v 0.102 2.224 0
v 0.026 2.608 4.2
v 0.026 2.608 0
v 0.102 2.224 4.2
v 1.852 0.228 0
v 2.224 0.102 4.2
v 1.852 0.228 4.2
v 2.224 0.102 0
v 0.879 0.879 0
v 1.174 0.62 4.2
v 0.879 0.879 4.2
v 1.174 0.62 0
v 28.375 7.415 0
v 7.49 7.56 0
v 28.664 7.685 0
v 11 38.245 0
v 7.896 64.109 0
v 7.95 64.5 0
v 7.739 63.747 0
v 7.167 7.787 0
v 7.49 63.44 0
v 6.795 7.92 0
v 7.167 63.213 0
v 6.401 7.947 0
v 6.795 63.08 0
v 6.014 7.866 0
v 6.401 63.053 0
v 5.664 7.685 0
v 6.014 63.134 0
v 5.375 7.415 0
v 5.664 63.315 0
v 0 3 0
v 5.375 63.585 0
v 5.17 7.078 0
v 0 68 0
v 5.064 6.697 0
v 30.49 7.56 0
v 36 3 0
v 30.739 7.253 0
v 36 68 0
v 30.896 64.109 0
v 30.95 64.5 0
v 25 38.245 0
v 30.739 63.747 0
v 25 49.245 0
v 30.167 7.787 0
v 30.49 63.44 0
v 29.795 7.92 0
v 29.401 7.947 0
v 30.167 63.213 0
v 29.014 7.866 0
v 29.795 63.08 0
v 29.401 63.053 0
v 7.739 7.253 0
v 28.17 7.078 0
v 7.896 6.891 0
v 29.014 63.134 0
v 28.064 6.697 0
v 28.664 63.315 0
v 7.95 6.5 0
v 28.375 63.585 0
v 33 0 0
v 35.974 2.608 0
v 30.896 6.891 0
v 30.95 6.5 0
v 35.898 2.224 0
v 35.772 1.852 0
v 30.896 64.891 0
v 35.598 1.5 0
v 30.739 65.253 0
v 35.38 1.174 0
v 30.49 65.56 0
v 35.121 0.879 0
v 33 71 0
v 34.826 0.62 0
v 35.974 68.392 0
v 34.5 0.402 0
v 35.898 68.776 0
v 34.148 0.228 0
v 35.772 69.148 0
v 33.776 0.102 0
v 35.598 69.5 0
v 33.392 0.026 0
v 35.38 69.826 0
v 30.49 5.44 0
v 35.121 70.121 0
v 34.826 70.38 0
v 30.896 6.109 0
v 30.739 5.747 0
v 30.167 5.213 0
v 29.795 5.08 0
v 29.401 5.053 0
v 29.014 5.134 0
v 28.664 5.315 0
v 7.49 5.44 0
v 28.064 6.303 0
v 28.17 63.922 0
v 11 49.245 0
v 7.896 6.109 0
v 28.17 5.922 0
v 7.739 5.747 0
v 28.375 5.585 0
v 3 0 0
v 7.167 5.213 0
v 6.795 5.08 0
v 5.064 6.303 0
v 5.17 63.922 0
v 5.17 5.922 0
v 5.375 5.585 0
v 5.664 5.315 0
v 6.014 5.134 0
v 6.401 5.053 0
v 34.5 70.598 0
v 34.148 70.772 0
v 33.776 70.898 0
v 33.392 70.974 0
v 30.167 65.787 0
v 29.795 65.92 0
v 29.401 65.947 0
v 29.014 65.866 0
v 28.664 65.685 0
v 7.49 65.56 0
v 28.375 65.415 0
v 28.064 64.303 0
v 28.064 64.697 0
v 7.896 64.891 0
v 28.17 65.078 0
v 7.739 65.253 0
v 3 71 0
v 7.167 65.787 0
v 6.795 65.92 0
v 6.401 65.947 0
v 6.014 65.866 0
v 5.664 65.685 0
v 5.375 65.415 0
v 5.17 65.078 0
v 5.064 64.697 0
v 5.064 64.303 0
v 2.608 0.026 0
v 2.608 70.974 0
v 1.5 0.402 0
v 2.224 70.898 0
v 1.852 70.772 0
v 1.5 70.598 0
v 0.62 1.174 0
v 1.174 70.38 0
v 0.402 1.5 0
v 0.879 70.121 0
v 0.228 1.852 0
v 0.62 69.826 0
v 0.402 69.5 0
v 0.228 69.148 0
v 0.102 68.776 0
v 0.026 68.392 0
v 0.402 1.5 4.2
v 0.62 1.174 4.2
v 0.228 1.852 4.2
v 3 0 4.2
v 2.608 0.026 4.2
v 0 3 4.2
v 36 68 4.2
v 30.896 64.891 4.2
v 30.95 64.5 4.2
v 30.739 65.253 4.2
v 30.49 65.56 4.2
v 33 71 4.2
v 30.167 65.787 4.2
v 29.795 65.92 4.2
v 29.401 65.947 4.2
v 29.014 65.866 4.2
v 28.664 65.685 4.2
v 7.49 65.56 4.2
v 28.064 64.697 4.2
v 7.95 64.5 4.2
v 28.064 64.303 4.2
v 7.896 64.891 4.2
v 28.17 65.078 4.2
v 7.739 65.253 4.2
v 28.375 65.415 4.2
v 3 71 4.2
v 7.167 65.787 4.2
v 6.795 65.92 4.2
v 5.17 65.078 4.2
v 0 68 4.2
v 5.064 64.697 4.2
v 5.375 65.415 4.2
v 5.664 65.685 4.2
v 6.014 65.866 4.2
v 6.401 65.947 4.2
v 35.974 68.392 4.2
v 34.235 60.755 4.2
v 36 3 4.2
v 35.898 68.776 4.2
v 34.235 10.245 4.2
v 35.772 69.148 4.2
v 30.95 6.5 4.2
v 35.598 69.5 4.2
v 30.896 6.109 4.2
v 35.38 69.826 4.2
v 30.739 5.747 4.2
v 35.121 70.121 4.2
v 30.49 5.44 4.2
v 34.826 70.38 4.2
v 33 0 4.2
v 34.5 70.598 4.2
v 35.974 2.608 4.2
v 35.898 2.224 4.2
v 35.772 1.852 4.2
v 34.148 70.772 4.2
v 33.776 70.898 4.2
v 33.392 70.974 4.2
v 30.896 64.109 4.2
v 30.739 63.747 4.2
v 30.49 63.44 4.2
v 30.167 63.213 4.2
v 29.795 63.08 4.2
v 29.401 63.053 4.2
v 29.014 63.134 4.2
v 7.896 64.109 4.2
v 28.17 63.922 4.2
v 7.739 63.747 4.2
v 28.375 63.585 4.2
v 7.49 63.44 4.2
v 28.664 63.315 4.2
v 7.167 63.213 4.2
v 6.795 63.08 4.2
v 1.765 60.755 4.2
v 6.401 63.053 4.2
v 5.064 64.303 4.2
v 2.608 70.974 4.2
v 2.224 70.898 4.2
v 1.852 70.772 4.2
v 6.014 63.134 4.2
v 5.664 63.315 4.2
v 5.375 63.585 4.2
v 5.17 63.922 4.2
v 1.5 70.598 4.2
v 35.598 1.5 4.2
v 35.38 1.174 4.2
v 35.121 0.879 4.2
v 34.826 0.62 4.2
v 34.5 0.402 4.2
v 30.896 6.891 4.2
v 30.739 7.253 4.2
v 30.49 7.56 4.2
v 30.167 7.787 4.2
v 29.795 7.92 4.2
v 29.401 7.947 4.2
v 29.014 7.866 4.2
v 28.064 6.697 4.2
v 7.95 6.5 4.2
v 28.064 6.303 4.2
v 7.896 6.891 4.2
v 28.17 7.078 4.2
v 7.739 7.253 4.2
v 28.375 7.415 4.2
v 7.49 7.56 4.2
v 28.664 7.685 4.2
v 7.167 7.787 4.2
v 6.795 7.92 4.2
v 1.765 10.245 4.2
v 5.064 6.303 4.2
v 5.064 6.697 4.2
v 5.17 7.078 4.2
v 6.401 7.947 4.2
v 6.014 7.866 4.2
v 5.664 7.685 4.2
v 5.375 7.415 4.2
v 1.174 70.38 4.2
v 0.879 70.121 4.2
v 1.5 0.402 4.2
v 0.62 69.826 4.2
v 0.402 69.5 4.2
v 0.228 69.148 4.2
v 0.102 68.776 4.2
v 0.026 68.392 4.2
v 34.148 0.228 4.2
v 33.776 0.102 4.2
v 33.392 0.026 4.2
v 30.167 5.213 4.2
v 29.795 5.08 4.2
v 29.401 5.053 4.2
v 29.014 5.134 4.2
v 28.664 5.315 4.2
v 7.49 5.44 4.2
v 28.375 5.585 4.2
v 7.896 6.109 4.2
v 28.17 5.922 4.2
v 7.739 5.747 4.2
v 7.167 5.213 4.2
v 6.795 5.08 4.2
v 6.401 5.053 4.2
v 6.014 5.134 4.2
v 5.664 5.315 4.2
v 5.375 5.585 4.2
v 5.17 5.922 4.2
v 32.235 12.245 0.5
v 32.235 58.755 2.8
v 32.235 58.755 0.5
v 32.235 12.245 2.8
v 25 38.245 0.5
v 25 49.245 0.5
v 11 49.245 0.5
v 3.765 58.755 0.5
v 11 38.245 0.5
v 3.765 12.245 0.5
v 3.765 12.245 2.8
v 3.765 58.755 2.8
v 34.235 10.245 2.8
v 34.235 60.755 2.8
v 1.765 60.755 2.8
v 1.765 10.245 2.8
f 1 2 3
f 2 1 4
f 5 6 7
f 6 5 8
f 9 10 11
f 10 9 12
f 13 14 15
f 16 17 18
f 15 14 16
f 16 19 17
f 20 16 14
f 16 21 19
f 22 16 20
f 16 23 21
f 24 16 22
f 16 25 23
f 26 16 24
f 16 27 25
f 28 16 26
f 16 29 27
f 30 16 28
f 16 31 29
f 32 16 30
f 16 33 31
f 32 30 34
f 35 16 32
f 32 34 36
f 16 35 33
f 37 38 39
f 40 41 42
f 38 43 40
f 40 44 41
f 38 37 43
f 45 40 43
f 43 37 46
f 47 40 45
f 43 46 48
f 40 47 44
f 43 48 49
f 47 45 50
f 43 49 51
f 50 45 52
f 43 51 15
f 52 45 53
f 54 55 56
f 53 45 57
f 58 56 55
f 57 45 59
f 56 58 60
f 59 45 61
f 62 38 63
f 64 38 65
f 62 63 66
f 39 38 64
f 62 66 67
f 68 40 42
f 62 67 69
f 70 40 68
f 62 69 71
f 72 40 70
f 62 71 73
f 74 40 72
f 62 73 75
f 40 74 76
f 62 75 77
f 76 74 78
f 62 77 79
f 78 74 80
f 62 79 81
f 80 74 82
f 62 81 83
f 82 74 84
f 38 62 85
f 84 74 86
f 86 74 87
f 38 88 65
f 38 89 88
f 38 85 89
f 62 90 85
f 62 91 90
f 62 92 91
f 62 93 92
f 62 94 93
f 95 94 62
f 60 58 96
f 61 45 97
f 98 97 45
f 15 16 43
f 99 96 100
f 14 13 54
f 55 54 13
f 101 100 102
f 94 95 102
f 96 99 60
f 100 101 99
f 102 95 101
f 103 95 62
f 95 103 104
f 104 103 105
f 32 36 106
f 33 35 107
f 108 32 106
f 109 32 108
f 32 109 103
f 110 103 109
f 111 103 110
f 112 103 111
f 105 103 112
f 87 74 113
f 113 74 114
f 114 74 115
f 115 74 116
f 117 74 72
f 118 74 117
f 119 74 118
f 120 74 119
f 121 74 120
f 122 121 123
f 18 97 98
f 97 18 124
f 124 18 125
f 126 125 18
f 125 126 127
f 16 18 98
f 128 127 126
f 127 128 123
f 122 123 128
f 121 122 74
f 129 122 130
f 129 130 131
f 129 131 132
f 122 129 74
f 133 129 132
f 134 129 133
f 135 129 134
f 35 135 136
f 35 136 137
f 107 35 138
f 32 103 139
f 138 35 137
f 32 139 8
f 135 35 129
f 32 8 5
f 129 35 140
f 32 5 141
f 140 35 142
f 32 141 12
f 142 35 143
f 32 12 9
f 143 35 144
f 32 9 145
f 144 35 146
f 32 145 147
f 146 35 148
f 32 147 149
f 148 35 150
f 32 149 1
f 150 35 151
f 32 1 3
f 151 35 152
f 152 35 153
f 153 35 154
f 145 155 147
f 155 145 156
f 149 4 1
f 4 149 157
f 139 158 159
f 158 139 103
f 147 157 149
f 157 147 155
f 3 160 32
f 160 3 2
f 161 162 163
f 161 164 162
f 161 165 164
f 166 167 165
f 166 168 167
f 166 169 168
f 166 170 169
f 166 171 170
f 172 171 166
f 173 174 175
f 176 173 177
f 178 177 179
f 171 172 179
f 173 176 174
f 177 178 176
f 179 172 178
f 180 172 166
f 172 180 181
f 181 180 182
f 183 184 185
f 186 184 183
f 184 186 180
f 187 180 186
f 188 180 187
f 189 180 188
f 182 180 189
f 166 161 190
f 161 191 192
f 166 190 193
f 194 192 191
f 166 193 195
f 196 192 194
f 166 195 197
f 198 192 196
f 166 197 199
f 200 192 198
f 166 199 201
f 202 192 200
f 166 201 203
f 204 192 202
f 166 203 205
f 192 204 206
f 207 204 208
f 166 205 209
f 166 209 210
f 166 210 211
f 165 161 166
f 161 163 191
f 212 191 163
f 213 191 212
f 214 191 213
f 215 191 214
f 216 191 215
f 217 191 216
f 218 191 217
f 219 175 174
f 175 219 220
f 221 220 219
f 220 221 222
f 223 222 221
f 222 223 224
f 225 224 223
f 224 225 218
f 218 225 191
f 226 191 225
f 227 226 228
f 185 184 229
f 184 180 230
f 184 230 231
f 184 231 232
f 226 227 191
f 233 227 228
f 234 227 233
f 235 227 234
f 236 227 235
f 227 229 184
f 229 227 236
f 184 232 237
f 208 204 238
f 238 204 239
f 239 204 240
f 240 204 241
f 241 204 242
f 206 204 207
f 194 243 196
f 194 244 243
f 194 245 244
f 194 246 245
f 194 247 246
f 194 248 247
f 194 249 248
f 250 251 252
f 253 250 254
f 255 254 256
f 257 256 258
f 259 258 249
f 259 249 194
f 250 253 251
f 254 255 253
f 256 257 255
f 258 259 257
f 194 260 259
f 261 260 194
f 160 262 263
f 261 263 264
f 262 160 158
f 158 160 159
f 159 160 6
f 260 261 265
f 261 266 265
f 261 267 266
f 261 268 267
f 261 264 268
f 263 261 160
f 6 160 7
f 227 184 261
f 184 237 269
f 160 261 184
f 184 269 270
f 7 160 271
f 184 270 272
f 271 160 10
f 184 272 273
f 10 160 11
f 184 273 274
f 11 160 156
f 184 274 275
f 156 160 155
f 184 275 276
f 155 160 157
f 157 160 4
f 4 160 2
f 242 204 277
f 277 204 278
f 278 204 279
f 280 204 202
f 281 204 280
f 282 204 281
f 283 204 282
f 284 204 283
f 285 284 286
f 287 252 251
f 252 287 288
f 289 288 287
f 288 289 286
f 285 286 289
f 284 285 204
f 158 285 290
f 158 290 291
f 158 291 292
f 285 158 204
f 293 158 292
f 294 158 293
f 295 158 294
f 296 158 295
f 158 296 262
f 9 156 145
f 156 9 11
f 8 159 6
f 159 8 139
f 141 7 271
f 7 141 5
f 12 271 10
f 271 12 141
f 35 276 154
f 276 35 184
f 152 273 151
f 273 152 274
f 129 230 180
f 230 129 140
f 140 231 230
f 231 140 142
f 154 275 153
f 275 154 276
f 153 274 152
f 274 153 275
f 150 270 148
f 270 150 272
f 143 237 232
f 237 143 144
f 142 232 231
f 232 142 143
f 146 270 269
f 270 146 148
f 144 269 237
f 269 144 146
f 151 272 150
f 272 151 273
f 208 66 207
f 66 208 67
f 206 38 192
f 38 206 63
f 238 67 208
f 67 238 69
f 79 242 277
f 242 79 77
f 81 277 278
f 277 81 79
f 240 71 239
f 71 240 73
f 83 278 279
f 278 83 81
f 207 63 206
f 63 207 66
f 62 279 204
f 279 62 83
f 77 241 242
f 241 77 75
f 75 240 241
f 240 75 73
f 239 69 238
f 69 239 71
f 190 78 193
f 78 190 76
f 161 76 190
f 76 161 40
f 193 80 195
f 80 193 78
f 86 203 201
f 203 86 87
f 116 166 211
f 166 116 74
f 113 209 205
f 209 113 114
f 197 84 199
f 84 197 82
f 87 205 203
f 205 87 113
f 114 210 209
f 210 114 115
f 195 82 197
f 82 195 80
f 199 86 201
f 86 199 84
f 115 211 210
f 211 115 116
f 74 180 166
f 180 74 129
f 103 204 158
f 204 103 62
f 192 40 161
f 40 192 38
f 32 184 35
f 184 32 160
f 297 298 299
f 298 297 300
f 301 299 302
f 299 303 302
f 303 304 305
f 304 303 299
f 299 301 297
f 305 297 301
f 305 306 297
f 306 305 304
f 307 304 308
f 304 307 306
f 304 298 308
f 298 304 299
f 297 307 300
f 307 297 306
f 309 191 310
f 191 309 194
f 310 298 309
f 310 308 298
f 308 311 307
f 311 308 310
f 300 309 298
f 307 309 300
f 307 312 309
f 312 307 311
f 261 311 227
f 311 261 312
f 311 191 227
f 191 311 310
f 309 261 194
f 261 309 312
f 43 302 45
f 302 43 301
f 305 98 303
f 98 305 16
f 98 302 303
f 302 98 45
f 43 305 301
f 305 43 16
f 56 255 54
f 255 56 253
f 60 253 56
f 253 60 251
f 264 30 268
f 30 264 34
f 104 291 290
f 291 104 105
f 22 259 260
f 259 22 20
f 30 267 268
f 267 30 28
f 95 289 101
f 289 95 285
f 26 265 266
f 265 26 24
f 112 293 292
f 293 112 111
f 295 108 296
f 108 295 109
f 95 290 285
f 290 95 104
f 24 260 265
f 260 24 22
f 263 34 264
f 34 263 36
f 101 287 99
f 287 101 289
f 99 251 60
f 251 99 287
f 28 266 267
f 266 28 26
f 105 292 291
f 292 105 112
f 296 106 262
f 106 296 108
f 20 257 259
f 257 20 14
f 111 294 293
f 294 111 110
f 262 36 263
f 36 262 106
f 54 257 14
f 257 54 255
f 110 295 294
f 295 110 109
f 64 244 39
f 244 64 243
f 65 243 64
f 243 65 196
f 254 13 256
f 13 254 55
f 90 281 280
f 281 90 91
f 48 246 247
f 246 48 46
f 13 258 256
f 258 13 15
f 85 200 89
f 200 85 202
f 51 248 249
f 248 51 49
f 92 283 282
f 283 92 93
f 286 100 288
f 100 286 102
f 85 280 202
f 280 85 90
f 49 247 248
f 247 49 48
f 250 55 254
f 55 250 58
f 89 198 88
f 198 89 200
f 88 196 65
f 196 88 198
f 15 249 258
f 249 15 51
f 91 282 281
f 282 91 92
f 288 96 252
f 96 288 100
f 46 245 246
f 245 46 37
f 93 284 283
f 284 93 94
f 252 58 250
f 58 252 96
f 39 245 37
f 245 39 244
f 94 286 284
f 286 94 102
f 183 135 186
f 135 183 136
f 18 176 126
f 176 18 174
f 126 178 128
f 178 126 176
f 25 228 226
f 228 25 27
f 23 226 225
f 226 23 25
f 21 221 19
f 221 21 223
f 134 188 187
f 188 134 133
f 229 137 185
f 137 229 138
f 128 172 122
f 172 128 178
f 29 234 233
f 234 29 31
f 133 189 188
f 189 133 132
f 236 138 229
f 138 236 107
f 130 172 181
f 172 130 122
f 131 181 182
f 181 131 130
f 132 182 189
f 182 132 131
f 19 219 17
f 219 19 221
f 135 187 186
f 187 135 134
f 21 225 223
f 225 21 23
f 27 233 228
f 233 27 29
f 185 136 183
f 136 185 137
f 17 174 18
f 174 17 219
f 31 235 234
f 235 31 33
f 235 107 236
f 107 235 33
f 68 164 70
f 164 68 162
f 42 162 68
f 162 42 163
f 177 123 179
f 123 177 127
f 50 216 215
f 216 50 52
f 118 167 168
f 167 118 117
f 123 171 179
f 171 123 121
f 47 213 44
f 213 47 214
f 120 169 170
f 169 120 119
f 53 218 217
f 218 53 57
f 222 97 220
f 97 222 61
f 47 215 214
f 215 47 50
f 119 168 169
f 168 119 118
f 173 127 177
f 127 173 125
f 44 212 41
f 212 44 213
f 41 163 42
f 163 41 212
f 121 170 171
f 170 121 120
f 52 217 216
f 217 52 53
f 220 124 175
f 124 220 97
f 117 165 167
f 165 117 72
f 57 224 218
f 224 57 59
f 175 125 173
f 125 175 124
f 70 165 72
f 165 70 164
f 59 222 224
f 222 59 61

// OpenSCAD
// file: globals.scad
// PI Zero
pizero_width = 30;
pizero_height = 65;
pizero_screw_padding=3.5;
pizero_first_micro_usb_y=35;

// Keyboard
keyboard_circuit_width=27.97;
keyboard_circuit_height=46.01;
keyboard_circuit_thickness=0.95;
keyboard_pressed_button_thickness=1.35;
keyboard_released_button_thickness=1.5;
keyboard_tca8418_thickness=0.85;

// Box
box_circuit_padding=2;
box_inner_width=pizero_width+box_circuit_padding*2;
box_inner_height=pizero_height+box_circuit_padding*2;
box_inner_depth=30;
box_wall_thickness=1;
box_outer_width=box_inner_width+box_wall_thickness*2;
box_outer_height=box_inner_height+box_wall_thickness*2;
box_outer_depth=box_inner_depth+box_wall_thickness;
box_corner_radius=3;
box_nut_tolerance=0.25;
box_nut_width=5+box_nut_tolerance;
box_nut_thickness=2;

// Lid
lid_width=box_outer_width;
lid_height=box_outer_height;
lid_mask_thickness=0.5;
lid_film_thickness=1.4;
lid_film_glue_frame_width=2;
lid_slot_padding=0.5;
lid_slot_width=keyboard_circuit_width+lid_slot_padding;
lid_slot_height=keyboard_circuit_height+lid_slot_padding;
lid_slot_depth=keyboard_circuit_thickness+
               keyboard_tca8418_thickness+
               lid_mask_thickness+
               lid_film_thickness;
lid_slot_floor_thickness=0.5;
lid_thickness=lid_slot_floor_thickness+lid_slot_depth;
lid_slot_hole_y=26;
lid_slot_hole_width=14;
lid_slot_hole_height=11;
lid_screw_padding=box_circuit_padding+pizero_screw_padding;
lid_screw_tolerance=0.25;
lid_screw_radius=2.4/2+lid_screw_tolerance;
// main file
use <MCAD/boxes.scad>
include <globals.scad>

$fa=1;
$fs=0.4;

difference() {
    // Lid
    translate([lid_width/2,lid_height/2,lid_thickness/2])
        roundedBox(size=[lid_width,lid_height,lid_thickness],
                   radius=box_corner_radius,
                   sidesonly=true);
    // Slot
    translate([(lid_width-lid_slot_width)/2,
               (lid_height-lid_slot_height)/2,
               lid_slot_floor_thickness])
        cube([lid_slot_width, lid_slot_height,
              lid_slot_depth*2]);
    // Film glue frame
    translate([(lid_width-(lid_slot_width+                 
                           lid_film_glue_frame_width*2))/2,
               (lid_height-(lid_slot_height+
                            lid_film_glue_frame_width*2))/2,
               lid_thickness-lid_film_thickness])
        cube([lid_slot_width+lid_film_glue_frame_width*2,
              lid_slot_height+lid_film_glue_frame_width*2,
              lid_film_thickness+0.001]);
    // Hole
    translate([lid_width/2-lid_slot_hole_width/2,
               (lid_height-lid_slot_height)/2+lid_slot_hole_y,
               -lid_slot_floor_thickness/4])
        cube([lid_slot_hole_width,lid_slot_hole_height,
              lid_slot_floor_thickness*2]);
    // Left bottom screw hole
    translate([box_wall_thickness+lid_screw_padding,
               box_wall_thickness+lid_screw_padding,
               -lid_thickness/2])
        cylinder(r=lid_screw_radius,
                 h=lid_thickness*2);
    // Right bottom screw hole
    translate([lid_width-
               (box_wall_thickness+lid_screw_padding),
               box_wall_thickness+lid_screw_padding, 
               -lid_thickness/2])
        cylinder(r=lid_screw_radius,
                 h=lid_thickness*2);
    // Left top screw hole
    translate([box_wall_thickness+lid_screw_padding,
               lid_height-
               (box_wall_thickness+lid_screw_padding),
               -lid_thickness/2])
        cylinder(r=lid_screw_radius,
                 h=lid_thickness*2);
    // Right top screw hole
    translate([lid_width-
               (box_wall_thickness+lid_screw_padding),
               lid_height-
               (box_wall_thickness+lid_screw_padding),
               -lid_thickness/2])
    cylinder(r=lid_screw_radius,h=lid_thickness*2);
}
